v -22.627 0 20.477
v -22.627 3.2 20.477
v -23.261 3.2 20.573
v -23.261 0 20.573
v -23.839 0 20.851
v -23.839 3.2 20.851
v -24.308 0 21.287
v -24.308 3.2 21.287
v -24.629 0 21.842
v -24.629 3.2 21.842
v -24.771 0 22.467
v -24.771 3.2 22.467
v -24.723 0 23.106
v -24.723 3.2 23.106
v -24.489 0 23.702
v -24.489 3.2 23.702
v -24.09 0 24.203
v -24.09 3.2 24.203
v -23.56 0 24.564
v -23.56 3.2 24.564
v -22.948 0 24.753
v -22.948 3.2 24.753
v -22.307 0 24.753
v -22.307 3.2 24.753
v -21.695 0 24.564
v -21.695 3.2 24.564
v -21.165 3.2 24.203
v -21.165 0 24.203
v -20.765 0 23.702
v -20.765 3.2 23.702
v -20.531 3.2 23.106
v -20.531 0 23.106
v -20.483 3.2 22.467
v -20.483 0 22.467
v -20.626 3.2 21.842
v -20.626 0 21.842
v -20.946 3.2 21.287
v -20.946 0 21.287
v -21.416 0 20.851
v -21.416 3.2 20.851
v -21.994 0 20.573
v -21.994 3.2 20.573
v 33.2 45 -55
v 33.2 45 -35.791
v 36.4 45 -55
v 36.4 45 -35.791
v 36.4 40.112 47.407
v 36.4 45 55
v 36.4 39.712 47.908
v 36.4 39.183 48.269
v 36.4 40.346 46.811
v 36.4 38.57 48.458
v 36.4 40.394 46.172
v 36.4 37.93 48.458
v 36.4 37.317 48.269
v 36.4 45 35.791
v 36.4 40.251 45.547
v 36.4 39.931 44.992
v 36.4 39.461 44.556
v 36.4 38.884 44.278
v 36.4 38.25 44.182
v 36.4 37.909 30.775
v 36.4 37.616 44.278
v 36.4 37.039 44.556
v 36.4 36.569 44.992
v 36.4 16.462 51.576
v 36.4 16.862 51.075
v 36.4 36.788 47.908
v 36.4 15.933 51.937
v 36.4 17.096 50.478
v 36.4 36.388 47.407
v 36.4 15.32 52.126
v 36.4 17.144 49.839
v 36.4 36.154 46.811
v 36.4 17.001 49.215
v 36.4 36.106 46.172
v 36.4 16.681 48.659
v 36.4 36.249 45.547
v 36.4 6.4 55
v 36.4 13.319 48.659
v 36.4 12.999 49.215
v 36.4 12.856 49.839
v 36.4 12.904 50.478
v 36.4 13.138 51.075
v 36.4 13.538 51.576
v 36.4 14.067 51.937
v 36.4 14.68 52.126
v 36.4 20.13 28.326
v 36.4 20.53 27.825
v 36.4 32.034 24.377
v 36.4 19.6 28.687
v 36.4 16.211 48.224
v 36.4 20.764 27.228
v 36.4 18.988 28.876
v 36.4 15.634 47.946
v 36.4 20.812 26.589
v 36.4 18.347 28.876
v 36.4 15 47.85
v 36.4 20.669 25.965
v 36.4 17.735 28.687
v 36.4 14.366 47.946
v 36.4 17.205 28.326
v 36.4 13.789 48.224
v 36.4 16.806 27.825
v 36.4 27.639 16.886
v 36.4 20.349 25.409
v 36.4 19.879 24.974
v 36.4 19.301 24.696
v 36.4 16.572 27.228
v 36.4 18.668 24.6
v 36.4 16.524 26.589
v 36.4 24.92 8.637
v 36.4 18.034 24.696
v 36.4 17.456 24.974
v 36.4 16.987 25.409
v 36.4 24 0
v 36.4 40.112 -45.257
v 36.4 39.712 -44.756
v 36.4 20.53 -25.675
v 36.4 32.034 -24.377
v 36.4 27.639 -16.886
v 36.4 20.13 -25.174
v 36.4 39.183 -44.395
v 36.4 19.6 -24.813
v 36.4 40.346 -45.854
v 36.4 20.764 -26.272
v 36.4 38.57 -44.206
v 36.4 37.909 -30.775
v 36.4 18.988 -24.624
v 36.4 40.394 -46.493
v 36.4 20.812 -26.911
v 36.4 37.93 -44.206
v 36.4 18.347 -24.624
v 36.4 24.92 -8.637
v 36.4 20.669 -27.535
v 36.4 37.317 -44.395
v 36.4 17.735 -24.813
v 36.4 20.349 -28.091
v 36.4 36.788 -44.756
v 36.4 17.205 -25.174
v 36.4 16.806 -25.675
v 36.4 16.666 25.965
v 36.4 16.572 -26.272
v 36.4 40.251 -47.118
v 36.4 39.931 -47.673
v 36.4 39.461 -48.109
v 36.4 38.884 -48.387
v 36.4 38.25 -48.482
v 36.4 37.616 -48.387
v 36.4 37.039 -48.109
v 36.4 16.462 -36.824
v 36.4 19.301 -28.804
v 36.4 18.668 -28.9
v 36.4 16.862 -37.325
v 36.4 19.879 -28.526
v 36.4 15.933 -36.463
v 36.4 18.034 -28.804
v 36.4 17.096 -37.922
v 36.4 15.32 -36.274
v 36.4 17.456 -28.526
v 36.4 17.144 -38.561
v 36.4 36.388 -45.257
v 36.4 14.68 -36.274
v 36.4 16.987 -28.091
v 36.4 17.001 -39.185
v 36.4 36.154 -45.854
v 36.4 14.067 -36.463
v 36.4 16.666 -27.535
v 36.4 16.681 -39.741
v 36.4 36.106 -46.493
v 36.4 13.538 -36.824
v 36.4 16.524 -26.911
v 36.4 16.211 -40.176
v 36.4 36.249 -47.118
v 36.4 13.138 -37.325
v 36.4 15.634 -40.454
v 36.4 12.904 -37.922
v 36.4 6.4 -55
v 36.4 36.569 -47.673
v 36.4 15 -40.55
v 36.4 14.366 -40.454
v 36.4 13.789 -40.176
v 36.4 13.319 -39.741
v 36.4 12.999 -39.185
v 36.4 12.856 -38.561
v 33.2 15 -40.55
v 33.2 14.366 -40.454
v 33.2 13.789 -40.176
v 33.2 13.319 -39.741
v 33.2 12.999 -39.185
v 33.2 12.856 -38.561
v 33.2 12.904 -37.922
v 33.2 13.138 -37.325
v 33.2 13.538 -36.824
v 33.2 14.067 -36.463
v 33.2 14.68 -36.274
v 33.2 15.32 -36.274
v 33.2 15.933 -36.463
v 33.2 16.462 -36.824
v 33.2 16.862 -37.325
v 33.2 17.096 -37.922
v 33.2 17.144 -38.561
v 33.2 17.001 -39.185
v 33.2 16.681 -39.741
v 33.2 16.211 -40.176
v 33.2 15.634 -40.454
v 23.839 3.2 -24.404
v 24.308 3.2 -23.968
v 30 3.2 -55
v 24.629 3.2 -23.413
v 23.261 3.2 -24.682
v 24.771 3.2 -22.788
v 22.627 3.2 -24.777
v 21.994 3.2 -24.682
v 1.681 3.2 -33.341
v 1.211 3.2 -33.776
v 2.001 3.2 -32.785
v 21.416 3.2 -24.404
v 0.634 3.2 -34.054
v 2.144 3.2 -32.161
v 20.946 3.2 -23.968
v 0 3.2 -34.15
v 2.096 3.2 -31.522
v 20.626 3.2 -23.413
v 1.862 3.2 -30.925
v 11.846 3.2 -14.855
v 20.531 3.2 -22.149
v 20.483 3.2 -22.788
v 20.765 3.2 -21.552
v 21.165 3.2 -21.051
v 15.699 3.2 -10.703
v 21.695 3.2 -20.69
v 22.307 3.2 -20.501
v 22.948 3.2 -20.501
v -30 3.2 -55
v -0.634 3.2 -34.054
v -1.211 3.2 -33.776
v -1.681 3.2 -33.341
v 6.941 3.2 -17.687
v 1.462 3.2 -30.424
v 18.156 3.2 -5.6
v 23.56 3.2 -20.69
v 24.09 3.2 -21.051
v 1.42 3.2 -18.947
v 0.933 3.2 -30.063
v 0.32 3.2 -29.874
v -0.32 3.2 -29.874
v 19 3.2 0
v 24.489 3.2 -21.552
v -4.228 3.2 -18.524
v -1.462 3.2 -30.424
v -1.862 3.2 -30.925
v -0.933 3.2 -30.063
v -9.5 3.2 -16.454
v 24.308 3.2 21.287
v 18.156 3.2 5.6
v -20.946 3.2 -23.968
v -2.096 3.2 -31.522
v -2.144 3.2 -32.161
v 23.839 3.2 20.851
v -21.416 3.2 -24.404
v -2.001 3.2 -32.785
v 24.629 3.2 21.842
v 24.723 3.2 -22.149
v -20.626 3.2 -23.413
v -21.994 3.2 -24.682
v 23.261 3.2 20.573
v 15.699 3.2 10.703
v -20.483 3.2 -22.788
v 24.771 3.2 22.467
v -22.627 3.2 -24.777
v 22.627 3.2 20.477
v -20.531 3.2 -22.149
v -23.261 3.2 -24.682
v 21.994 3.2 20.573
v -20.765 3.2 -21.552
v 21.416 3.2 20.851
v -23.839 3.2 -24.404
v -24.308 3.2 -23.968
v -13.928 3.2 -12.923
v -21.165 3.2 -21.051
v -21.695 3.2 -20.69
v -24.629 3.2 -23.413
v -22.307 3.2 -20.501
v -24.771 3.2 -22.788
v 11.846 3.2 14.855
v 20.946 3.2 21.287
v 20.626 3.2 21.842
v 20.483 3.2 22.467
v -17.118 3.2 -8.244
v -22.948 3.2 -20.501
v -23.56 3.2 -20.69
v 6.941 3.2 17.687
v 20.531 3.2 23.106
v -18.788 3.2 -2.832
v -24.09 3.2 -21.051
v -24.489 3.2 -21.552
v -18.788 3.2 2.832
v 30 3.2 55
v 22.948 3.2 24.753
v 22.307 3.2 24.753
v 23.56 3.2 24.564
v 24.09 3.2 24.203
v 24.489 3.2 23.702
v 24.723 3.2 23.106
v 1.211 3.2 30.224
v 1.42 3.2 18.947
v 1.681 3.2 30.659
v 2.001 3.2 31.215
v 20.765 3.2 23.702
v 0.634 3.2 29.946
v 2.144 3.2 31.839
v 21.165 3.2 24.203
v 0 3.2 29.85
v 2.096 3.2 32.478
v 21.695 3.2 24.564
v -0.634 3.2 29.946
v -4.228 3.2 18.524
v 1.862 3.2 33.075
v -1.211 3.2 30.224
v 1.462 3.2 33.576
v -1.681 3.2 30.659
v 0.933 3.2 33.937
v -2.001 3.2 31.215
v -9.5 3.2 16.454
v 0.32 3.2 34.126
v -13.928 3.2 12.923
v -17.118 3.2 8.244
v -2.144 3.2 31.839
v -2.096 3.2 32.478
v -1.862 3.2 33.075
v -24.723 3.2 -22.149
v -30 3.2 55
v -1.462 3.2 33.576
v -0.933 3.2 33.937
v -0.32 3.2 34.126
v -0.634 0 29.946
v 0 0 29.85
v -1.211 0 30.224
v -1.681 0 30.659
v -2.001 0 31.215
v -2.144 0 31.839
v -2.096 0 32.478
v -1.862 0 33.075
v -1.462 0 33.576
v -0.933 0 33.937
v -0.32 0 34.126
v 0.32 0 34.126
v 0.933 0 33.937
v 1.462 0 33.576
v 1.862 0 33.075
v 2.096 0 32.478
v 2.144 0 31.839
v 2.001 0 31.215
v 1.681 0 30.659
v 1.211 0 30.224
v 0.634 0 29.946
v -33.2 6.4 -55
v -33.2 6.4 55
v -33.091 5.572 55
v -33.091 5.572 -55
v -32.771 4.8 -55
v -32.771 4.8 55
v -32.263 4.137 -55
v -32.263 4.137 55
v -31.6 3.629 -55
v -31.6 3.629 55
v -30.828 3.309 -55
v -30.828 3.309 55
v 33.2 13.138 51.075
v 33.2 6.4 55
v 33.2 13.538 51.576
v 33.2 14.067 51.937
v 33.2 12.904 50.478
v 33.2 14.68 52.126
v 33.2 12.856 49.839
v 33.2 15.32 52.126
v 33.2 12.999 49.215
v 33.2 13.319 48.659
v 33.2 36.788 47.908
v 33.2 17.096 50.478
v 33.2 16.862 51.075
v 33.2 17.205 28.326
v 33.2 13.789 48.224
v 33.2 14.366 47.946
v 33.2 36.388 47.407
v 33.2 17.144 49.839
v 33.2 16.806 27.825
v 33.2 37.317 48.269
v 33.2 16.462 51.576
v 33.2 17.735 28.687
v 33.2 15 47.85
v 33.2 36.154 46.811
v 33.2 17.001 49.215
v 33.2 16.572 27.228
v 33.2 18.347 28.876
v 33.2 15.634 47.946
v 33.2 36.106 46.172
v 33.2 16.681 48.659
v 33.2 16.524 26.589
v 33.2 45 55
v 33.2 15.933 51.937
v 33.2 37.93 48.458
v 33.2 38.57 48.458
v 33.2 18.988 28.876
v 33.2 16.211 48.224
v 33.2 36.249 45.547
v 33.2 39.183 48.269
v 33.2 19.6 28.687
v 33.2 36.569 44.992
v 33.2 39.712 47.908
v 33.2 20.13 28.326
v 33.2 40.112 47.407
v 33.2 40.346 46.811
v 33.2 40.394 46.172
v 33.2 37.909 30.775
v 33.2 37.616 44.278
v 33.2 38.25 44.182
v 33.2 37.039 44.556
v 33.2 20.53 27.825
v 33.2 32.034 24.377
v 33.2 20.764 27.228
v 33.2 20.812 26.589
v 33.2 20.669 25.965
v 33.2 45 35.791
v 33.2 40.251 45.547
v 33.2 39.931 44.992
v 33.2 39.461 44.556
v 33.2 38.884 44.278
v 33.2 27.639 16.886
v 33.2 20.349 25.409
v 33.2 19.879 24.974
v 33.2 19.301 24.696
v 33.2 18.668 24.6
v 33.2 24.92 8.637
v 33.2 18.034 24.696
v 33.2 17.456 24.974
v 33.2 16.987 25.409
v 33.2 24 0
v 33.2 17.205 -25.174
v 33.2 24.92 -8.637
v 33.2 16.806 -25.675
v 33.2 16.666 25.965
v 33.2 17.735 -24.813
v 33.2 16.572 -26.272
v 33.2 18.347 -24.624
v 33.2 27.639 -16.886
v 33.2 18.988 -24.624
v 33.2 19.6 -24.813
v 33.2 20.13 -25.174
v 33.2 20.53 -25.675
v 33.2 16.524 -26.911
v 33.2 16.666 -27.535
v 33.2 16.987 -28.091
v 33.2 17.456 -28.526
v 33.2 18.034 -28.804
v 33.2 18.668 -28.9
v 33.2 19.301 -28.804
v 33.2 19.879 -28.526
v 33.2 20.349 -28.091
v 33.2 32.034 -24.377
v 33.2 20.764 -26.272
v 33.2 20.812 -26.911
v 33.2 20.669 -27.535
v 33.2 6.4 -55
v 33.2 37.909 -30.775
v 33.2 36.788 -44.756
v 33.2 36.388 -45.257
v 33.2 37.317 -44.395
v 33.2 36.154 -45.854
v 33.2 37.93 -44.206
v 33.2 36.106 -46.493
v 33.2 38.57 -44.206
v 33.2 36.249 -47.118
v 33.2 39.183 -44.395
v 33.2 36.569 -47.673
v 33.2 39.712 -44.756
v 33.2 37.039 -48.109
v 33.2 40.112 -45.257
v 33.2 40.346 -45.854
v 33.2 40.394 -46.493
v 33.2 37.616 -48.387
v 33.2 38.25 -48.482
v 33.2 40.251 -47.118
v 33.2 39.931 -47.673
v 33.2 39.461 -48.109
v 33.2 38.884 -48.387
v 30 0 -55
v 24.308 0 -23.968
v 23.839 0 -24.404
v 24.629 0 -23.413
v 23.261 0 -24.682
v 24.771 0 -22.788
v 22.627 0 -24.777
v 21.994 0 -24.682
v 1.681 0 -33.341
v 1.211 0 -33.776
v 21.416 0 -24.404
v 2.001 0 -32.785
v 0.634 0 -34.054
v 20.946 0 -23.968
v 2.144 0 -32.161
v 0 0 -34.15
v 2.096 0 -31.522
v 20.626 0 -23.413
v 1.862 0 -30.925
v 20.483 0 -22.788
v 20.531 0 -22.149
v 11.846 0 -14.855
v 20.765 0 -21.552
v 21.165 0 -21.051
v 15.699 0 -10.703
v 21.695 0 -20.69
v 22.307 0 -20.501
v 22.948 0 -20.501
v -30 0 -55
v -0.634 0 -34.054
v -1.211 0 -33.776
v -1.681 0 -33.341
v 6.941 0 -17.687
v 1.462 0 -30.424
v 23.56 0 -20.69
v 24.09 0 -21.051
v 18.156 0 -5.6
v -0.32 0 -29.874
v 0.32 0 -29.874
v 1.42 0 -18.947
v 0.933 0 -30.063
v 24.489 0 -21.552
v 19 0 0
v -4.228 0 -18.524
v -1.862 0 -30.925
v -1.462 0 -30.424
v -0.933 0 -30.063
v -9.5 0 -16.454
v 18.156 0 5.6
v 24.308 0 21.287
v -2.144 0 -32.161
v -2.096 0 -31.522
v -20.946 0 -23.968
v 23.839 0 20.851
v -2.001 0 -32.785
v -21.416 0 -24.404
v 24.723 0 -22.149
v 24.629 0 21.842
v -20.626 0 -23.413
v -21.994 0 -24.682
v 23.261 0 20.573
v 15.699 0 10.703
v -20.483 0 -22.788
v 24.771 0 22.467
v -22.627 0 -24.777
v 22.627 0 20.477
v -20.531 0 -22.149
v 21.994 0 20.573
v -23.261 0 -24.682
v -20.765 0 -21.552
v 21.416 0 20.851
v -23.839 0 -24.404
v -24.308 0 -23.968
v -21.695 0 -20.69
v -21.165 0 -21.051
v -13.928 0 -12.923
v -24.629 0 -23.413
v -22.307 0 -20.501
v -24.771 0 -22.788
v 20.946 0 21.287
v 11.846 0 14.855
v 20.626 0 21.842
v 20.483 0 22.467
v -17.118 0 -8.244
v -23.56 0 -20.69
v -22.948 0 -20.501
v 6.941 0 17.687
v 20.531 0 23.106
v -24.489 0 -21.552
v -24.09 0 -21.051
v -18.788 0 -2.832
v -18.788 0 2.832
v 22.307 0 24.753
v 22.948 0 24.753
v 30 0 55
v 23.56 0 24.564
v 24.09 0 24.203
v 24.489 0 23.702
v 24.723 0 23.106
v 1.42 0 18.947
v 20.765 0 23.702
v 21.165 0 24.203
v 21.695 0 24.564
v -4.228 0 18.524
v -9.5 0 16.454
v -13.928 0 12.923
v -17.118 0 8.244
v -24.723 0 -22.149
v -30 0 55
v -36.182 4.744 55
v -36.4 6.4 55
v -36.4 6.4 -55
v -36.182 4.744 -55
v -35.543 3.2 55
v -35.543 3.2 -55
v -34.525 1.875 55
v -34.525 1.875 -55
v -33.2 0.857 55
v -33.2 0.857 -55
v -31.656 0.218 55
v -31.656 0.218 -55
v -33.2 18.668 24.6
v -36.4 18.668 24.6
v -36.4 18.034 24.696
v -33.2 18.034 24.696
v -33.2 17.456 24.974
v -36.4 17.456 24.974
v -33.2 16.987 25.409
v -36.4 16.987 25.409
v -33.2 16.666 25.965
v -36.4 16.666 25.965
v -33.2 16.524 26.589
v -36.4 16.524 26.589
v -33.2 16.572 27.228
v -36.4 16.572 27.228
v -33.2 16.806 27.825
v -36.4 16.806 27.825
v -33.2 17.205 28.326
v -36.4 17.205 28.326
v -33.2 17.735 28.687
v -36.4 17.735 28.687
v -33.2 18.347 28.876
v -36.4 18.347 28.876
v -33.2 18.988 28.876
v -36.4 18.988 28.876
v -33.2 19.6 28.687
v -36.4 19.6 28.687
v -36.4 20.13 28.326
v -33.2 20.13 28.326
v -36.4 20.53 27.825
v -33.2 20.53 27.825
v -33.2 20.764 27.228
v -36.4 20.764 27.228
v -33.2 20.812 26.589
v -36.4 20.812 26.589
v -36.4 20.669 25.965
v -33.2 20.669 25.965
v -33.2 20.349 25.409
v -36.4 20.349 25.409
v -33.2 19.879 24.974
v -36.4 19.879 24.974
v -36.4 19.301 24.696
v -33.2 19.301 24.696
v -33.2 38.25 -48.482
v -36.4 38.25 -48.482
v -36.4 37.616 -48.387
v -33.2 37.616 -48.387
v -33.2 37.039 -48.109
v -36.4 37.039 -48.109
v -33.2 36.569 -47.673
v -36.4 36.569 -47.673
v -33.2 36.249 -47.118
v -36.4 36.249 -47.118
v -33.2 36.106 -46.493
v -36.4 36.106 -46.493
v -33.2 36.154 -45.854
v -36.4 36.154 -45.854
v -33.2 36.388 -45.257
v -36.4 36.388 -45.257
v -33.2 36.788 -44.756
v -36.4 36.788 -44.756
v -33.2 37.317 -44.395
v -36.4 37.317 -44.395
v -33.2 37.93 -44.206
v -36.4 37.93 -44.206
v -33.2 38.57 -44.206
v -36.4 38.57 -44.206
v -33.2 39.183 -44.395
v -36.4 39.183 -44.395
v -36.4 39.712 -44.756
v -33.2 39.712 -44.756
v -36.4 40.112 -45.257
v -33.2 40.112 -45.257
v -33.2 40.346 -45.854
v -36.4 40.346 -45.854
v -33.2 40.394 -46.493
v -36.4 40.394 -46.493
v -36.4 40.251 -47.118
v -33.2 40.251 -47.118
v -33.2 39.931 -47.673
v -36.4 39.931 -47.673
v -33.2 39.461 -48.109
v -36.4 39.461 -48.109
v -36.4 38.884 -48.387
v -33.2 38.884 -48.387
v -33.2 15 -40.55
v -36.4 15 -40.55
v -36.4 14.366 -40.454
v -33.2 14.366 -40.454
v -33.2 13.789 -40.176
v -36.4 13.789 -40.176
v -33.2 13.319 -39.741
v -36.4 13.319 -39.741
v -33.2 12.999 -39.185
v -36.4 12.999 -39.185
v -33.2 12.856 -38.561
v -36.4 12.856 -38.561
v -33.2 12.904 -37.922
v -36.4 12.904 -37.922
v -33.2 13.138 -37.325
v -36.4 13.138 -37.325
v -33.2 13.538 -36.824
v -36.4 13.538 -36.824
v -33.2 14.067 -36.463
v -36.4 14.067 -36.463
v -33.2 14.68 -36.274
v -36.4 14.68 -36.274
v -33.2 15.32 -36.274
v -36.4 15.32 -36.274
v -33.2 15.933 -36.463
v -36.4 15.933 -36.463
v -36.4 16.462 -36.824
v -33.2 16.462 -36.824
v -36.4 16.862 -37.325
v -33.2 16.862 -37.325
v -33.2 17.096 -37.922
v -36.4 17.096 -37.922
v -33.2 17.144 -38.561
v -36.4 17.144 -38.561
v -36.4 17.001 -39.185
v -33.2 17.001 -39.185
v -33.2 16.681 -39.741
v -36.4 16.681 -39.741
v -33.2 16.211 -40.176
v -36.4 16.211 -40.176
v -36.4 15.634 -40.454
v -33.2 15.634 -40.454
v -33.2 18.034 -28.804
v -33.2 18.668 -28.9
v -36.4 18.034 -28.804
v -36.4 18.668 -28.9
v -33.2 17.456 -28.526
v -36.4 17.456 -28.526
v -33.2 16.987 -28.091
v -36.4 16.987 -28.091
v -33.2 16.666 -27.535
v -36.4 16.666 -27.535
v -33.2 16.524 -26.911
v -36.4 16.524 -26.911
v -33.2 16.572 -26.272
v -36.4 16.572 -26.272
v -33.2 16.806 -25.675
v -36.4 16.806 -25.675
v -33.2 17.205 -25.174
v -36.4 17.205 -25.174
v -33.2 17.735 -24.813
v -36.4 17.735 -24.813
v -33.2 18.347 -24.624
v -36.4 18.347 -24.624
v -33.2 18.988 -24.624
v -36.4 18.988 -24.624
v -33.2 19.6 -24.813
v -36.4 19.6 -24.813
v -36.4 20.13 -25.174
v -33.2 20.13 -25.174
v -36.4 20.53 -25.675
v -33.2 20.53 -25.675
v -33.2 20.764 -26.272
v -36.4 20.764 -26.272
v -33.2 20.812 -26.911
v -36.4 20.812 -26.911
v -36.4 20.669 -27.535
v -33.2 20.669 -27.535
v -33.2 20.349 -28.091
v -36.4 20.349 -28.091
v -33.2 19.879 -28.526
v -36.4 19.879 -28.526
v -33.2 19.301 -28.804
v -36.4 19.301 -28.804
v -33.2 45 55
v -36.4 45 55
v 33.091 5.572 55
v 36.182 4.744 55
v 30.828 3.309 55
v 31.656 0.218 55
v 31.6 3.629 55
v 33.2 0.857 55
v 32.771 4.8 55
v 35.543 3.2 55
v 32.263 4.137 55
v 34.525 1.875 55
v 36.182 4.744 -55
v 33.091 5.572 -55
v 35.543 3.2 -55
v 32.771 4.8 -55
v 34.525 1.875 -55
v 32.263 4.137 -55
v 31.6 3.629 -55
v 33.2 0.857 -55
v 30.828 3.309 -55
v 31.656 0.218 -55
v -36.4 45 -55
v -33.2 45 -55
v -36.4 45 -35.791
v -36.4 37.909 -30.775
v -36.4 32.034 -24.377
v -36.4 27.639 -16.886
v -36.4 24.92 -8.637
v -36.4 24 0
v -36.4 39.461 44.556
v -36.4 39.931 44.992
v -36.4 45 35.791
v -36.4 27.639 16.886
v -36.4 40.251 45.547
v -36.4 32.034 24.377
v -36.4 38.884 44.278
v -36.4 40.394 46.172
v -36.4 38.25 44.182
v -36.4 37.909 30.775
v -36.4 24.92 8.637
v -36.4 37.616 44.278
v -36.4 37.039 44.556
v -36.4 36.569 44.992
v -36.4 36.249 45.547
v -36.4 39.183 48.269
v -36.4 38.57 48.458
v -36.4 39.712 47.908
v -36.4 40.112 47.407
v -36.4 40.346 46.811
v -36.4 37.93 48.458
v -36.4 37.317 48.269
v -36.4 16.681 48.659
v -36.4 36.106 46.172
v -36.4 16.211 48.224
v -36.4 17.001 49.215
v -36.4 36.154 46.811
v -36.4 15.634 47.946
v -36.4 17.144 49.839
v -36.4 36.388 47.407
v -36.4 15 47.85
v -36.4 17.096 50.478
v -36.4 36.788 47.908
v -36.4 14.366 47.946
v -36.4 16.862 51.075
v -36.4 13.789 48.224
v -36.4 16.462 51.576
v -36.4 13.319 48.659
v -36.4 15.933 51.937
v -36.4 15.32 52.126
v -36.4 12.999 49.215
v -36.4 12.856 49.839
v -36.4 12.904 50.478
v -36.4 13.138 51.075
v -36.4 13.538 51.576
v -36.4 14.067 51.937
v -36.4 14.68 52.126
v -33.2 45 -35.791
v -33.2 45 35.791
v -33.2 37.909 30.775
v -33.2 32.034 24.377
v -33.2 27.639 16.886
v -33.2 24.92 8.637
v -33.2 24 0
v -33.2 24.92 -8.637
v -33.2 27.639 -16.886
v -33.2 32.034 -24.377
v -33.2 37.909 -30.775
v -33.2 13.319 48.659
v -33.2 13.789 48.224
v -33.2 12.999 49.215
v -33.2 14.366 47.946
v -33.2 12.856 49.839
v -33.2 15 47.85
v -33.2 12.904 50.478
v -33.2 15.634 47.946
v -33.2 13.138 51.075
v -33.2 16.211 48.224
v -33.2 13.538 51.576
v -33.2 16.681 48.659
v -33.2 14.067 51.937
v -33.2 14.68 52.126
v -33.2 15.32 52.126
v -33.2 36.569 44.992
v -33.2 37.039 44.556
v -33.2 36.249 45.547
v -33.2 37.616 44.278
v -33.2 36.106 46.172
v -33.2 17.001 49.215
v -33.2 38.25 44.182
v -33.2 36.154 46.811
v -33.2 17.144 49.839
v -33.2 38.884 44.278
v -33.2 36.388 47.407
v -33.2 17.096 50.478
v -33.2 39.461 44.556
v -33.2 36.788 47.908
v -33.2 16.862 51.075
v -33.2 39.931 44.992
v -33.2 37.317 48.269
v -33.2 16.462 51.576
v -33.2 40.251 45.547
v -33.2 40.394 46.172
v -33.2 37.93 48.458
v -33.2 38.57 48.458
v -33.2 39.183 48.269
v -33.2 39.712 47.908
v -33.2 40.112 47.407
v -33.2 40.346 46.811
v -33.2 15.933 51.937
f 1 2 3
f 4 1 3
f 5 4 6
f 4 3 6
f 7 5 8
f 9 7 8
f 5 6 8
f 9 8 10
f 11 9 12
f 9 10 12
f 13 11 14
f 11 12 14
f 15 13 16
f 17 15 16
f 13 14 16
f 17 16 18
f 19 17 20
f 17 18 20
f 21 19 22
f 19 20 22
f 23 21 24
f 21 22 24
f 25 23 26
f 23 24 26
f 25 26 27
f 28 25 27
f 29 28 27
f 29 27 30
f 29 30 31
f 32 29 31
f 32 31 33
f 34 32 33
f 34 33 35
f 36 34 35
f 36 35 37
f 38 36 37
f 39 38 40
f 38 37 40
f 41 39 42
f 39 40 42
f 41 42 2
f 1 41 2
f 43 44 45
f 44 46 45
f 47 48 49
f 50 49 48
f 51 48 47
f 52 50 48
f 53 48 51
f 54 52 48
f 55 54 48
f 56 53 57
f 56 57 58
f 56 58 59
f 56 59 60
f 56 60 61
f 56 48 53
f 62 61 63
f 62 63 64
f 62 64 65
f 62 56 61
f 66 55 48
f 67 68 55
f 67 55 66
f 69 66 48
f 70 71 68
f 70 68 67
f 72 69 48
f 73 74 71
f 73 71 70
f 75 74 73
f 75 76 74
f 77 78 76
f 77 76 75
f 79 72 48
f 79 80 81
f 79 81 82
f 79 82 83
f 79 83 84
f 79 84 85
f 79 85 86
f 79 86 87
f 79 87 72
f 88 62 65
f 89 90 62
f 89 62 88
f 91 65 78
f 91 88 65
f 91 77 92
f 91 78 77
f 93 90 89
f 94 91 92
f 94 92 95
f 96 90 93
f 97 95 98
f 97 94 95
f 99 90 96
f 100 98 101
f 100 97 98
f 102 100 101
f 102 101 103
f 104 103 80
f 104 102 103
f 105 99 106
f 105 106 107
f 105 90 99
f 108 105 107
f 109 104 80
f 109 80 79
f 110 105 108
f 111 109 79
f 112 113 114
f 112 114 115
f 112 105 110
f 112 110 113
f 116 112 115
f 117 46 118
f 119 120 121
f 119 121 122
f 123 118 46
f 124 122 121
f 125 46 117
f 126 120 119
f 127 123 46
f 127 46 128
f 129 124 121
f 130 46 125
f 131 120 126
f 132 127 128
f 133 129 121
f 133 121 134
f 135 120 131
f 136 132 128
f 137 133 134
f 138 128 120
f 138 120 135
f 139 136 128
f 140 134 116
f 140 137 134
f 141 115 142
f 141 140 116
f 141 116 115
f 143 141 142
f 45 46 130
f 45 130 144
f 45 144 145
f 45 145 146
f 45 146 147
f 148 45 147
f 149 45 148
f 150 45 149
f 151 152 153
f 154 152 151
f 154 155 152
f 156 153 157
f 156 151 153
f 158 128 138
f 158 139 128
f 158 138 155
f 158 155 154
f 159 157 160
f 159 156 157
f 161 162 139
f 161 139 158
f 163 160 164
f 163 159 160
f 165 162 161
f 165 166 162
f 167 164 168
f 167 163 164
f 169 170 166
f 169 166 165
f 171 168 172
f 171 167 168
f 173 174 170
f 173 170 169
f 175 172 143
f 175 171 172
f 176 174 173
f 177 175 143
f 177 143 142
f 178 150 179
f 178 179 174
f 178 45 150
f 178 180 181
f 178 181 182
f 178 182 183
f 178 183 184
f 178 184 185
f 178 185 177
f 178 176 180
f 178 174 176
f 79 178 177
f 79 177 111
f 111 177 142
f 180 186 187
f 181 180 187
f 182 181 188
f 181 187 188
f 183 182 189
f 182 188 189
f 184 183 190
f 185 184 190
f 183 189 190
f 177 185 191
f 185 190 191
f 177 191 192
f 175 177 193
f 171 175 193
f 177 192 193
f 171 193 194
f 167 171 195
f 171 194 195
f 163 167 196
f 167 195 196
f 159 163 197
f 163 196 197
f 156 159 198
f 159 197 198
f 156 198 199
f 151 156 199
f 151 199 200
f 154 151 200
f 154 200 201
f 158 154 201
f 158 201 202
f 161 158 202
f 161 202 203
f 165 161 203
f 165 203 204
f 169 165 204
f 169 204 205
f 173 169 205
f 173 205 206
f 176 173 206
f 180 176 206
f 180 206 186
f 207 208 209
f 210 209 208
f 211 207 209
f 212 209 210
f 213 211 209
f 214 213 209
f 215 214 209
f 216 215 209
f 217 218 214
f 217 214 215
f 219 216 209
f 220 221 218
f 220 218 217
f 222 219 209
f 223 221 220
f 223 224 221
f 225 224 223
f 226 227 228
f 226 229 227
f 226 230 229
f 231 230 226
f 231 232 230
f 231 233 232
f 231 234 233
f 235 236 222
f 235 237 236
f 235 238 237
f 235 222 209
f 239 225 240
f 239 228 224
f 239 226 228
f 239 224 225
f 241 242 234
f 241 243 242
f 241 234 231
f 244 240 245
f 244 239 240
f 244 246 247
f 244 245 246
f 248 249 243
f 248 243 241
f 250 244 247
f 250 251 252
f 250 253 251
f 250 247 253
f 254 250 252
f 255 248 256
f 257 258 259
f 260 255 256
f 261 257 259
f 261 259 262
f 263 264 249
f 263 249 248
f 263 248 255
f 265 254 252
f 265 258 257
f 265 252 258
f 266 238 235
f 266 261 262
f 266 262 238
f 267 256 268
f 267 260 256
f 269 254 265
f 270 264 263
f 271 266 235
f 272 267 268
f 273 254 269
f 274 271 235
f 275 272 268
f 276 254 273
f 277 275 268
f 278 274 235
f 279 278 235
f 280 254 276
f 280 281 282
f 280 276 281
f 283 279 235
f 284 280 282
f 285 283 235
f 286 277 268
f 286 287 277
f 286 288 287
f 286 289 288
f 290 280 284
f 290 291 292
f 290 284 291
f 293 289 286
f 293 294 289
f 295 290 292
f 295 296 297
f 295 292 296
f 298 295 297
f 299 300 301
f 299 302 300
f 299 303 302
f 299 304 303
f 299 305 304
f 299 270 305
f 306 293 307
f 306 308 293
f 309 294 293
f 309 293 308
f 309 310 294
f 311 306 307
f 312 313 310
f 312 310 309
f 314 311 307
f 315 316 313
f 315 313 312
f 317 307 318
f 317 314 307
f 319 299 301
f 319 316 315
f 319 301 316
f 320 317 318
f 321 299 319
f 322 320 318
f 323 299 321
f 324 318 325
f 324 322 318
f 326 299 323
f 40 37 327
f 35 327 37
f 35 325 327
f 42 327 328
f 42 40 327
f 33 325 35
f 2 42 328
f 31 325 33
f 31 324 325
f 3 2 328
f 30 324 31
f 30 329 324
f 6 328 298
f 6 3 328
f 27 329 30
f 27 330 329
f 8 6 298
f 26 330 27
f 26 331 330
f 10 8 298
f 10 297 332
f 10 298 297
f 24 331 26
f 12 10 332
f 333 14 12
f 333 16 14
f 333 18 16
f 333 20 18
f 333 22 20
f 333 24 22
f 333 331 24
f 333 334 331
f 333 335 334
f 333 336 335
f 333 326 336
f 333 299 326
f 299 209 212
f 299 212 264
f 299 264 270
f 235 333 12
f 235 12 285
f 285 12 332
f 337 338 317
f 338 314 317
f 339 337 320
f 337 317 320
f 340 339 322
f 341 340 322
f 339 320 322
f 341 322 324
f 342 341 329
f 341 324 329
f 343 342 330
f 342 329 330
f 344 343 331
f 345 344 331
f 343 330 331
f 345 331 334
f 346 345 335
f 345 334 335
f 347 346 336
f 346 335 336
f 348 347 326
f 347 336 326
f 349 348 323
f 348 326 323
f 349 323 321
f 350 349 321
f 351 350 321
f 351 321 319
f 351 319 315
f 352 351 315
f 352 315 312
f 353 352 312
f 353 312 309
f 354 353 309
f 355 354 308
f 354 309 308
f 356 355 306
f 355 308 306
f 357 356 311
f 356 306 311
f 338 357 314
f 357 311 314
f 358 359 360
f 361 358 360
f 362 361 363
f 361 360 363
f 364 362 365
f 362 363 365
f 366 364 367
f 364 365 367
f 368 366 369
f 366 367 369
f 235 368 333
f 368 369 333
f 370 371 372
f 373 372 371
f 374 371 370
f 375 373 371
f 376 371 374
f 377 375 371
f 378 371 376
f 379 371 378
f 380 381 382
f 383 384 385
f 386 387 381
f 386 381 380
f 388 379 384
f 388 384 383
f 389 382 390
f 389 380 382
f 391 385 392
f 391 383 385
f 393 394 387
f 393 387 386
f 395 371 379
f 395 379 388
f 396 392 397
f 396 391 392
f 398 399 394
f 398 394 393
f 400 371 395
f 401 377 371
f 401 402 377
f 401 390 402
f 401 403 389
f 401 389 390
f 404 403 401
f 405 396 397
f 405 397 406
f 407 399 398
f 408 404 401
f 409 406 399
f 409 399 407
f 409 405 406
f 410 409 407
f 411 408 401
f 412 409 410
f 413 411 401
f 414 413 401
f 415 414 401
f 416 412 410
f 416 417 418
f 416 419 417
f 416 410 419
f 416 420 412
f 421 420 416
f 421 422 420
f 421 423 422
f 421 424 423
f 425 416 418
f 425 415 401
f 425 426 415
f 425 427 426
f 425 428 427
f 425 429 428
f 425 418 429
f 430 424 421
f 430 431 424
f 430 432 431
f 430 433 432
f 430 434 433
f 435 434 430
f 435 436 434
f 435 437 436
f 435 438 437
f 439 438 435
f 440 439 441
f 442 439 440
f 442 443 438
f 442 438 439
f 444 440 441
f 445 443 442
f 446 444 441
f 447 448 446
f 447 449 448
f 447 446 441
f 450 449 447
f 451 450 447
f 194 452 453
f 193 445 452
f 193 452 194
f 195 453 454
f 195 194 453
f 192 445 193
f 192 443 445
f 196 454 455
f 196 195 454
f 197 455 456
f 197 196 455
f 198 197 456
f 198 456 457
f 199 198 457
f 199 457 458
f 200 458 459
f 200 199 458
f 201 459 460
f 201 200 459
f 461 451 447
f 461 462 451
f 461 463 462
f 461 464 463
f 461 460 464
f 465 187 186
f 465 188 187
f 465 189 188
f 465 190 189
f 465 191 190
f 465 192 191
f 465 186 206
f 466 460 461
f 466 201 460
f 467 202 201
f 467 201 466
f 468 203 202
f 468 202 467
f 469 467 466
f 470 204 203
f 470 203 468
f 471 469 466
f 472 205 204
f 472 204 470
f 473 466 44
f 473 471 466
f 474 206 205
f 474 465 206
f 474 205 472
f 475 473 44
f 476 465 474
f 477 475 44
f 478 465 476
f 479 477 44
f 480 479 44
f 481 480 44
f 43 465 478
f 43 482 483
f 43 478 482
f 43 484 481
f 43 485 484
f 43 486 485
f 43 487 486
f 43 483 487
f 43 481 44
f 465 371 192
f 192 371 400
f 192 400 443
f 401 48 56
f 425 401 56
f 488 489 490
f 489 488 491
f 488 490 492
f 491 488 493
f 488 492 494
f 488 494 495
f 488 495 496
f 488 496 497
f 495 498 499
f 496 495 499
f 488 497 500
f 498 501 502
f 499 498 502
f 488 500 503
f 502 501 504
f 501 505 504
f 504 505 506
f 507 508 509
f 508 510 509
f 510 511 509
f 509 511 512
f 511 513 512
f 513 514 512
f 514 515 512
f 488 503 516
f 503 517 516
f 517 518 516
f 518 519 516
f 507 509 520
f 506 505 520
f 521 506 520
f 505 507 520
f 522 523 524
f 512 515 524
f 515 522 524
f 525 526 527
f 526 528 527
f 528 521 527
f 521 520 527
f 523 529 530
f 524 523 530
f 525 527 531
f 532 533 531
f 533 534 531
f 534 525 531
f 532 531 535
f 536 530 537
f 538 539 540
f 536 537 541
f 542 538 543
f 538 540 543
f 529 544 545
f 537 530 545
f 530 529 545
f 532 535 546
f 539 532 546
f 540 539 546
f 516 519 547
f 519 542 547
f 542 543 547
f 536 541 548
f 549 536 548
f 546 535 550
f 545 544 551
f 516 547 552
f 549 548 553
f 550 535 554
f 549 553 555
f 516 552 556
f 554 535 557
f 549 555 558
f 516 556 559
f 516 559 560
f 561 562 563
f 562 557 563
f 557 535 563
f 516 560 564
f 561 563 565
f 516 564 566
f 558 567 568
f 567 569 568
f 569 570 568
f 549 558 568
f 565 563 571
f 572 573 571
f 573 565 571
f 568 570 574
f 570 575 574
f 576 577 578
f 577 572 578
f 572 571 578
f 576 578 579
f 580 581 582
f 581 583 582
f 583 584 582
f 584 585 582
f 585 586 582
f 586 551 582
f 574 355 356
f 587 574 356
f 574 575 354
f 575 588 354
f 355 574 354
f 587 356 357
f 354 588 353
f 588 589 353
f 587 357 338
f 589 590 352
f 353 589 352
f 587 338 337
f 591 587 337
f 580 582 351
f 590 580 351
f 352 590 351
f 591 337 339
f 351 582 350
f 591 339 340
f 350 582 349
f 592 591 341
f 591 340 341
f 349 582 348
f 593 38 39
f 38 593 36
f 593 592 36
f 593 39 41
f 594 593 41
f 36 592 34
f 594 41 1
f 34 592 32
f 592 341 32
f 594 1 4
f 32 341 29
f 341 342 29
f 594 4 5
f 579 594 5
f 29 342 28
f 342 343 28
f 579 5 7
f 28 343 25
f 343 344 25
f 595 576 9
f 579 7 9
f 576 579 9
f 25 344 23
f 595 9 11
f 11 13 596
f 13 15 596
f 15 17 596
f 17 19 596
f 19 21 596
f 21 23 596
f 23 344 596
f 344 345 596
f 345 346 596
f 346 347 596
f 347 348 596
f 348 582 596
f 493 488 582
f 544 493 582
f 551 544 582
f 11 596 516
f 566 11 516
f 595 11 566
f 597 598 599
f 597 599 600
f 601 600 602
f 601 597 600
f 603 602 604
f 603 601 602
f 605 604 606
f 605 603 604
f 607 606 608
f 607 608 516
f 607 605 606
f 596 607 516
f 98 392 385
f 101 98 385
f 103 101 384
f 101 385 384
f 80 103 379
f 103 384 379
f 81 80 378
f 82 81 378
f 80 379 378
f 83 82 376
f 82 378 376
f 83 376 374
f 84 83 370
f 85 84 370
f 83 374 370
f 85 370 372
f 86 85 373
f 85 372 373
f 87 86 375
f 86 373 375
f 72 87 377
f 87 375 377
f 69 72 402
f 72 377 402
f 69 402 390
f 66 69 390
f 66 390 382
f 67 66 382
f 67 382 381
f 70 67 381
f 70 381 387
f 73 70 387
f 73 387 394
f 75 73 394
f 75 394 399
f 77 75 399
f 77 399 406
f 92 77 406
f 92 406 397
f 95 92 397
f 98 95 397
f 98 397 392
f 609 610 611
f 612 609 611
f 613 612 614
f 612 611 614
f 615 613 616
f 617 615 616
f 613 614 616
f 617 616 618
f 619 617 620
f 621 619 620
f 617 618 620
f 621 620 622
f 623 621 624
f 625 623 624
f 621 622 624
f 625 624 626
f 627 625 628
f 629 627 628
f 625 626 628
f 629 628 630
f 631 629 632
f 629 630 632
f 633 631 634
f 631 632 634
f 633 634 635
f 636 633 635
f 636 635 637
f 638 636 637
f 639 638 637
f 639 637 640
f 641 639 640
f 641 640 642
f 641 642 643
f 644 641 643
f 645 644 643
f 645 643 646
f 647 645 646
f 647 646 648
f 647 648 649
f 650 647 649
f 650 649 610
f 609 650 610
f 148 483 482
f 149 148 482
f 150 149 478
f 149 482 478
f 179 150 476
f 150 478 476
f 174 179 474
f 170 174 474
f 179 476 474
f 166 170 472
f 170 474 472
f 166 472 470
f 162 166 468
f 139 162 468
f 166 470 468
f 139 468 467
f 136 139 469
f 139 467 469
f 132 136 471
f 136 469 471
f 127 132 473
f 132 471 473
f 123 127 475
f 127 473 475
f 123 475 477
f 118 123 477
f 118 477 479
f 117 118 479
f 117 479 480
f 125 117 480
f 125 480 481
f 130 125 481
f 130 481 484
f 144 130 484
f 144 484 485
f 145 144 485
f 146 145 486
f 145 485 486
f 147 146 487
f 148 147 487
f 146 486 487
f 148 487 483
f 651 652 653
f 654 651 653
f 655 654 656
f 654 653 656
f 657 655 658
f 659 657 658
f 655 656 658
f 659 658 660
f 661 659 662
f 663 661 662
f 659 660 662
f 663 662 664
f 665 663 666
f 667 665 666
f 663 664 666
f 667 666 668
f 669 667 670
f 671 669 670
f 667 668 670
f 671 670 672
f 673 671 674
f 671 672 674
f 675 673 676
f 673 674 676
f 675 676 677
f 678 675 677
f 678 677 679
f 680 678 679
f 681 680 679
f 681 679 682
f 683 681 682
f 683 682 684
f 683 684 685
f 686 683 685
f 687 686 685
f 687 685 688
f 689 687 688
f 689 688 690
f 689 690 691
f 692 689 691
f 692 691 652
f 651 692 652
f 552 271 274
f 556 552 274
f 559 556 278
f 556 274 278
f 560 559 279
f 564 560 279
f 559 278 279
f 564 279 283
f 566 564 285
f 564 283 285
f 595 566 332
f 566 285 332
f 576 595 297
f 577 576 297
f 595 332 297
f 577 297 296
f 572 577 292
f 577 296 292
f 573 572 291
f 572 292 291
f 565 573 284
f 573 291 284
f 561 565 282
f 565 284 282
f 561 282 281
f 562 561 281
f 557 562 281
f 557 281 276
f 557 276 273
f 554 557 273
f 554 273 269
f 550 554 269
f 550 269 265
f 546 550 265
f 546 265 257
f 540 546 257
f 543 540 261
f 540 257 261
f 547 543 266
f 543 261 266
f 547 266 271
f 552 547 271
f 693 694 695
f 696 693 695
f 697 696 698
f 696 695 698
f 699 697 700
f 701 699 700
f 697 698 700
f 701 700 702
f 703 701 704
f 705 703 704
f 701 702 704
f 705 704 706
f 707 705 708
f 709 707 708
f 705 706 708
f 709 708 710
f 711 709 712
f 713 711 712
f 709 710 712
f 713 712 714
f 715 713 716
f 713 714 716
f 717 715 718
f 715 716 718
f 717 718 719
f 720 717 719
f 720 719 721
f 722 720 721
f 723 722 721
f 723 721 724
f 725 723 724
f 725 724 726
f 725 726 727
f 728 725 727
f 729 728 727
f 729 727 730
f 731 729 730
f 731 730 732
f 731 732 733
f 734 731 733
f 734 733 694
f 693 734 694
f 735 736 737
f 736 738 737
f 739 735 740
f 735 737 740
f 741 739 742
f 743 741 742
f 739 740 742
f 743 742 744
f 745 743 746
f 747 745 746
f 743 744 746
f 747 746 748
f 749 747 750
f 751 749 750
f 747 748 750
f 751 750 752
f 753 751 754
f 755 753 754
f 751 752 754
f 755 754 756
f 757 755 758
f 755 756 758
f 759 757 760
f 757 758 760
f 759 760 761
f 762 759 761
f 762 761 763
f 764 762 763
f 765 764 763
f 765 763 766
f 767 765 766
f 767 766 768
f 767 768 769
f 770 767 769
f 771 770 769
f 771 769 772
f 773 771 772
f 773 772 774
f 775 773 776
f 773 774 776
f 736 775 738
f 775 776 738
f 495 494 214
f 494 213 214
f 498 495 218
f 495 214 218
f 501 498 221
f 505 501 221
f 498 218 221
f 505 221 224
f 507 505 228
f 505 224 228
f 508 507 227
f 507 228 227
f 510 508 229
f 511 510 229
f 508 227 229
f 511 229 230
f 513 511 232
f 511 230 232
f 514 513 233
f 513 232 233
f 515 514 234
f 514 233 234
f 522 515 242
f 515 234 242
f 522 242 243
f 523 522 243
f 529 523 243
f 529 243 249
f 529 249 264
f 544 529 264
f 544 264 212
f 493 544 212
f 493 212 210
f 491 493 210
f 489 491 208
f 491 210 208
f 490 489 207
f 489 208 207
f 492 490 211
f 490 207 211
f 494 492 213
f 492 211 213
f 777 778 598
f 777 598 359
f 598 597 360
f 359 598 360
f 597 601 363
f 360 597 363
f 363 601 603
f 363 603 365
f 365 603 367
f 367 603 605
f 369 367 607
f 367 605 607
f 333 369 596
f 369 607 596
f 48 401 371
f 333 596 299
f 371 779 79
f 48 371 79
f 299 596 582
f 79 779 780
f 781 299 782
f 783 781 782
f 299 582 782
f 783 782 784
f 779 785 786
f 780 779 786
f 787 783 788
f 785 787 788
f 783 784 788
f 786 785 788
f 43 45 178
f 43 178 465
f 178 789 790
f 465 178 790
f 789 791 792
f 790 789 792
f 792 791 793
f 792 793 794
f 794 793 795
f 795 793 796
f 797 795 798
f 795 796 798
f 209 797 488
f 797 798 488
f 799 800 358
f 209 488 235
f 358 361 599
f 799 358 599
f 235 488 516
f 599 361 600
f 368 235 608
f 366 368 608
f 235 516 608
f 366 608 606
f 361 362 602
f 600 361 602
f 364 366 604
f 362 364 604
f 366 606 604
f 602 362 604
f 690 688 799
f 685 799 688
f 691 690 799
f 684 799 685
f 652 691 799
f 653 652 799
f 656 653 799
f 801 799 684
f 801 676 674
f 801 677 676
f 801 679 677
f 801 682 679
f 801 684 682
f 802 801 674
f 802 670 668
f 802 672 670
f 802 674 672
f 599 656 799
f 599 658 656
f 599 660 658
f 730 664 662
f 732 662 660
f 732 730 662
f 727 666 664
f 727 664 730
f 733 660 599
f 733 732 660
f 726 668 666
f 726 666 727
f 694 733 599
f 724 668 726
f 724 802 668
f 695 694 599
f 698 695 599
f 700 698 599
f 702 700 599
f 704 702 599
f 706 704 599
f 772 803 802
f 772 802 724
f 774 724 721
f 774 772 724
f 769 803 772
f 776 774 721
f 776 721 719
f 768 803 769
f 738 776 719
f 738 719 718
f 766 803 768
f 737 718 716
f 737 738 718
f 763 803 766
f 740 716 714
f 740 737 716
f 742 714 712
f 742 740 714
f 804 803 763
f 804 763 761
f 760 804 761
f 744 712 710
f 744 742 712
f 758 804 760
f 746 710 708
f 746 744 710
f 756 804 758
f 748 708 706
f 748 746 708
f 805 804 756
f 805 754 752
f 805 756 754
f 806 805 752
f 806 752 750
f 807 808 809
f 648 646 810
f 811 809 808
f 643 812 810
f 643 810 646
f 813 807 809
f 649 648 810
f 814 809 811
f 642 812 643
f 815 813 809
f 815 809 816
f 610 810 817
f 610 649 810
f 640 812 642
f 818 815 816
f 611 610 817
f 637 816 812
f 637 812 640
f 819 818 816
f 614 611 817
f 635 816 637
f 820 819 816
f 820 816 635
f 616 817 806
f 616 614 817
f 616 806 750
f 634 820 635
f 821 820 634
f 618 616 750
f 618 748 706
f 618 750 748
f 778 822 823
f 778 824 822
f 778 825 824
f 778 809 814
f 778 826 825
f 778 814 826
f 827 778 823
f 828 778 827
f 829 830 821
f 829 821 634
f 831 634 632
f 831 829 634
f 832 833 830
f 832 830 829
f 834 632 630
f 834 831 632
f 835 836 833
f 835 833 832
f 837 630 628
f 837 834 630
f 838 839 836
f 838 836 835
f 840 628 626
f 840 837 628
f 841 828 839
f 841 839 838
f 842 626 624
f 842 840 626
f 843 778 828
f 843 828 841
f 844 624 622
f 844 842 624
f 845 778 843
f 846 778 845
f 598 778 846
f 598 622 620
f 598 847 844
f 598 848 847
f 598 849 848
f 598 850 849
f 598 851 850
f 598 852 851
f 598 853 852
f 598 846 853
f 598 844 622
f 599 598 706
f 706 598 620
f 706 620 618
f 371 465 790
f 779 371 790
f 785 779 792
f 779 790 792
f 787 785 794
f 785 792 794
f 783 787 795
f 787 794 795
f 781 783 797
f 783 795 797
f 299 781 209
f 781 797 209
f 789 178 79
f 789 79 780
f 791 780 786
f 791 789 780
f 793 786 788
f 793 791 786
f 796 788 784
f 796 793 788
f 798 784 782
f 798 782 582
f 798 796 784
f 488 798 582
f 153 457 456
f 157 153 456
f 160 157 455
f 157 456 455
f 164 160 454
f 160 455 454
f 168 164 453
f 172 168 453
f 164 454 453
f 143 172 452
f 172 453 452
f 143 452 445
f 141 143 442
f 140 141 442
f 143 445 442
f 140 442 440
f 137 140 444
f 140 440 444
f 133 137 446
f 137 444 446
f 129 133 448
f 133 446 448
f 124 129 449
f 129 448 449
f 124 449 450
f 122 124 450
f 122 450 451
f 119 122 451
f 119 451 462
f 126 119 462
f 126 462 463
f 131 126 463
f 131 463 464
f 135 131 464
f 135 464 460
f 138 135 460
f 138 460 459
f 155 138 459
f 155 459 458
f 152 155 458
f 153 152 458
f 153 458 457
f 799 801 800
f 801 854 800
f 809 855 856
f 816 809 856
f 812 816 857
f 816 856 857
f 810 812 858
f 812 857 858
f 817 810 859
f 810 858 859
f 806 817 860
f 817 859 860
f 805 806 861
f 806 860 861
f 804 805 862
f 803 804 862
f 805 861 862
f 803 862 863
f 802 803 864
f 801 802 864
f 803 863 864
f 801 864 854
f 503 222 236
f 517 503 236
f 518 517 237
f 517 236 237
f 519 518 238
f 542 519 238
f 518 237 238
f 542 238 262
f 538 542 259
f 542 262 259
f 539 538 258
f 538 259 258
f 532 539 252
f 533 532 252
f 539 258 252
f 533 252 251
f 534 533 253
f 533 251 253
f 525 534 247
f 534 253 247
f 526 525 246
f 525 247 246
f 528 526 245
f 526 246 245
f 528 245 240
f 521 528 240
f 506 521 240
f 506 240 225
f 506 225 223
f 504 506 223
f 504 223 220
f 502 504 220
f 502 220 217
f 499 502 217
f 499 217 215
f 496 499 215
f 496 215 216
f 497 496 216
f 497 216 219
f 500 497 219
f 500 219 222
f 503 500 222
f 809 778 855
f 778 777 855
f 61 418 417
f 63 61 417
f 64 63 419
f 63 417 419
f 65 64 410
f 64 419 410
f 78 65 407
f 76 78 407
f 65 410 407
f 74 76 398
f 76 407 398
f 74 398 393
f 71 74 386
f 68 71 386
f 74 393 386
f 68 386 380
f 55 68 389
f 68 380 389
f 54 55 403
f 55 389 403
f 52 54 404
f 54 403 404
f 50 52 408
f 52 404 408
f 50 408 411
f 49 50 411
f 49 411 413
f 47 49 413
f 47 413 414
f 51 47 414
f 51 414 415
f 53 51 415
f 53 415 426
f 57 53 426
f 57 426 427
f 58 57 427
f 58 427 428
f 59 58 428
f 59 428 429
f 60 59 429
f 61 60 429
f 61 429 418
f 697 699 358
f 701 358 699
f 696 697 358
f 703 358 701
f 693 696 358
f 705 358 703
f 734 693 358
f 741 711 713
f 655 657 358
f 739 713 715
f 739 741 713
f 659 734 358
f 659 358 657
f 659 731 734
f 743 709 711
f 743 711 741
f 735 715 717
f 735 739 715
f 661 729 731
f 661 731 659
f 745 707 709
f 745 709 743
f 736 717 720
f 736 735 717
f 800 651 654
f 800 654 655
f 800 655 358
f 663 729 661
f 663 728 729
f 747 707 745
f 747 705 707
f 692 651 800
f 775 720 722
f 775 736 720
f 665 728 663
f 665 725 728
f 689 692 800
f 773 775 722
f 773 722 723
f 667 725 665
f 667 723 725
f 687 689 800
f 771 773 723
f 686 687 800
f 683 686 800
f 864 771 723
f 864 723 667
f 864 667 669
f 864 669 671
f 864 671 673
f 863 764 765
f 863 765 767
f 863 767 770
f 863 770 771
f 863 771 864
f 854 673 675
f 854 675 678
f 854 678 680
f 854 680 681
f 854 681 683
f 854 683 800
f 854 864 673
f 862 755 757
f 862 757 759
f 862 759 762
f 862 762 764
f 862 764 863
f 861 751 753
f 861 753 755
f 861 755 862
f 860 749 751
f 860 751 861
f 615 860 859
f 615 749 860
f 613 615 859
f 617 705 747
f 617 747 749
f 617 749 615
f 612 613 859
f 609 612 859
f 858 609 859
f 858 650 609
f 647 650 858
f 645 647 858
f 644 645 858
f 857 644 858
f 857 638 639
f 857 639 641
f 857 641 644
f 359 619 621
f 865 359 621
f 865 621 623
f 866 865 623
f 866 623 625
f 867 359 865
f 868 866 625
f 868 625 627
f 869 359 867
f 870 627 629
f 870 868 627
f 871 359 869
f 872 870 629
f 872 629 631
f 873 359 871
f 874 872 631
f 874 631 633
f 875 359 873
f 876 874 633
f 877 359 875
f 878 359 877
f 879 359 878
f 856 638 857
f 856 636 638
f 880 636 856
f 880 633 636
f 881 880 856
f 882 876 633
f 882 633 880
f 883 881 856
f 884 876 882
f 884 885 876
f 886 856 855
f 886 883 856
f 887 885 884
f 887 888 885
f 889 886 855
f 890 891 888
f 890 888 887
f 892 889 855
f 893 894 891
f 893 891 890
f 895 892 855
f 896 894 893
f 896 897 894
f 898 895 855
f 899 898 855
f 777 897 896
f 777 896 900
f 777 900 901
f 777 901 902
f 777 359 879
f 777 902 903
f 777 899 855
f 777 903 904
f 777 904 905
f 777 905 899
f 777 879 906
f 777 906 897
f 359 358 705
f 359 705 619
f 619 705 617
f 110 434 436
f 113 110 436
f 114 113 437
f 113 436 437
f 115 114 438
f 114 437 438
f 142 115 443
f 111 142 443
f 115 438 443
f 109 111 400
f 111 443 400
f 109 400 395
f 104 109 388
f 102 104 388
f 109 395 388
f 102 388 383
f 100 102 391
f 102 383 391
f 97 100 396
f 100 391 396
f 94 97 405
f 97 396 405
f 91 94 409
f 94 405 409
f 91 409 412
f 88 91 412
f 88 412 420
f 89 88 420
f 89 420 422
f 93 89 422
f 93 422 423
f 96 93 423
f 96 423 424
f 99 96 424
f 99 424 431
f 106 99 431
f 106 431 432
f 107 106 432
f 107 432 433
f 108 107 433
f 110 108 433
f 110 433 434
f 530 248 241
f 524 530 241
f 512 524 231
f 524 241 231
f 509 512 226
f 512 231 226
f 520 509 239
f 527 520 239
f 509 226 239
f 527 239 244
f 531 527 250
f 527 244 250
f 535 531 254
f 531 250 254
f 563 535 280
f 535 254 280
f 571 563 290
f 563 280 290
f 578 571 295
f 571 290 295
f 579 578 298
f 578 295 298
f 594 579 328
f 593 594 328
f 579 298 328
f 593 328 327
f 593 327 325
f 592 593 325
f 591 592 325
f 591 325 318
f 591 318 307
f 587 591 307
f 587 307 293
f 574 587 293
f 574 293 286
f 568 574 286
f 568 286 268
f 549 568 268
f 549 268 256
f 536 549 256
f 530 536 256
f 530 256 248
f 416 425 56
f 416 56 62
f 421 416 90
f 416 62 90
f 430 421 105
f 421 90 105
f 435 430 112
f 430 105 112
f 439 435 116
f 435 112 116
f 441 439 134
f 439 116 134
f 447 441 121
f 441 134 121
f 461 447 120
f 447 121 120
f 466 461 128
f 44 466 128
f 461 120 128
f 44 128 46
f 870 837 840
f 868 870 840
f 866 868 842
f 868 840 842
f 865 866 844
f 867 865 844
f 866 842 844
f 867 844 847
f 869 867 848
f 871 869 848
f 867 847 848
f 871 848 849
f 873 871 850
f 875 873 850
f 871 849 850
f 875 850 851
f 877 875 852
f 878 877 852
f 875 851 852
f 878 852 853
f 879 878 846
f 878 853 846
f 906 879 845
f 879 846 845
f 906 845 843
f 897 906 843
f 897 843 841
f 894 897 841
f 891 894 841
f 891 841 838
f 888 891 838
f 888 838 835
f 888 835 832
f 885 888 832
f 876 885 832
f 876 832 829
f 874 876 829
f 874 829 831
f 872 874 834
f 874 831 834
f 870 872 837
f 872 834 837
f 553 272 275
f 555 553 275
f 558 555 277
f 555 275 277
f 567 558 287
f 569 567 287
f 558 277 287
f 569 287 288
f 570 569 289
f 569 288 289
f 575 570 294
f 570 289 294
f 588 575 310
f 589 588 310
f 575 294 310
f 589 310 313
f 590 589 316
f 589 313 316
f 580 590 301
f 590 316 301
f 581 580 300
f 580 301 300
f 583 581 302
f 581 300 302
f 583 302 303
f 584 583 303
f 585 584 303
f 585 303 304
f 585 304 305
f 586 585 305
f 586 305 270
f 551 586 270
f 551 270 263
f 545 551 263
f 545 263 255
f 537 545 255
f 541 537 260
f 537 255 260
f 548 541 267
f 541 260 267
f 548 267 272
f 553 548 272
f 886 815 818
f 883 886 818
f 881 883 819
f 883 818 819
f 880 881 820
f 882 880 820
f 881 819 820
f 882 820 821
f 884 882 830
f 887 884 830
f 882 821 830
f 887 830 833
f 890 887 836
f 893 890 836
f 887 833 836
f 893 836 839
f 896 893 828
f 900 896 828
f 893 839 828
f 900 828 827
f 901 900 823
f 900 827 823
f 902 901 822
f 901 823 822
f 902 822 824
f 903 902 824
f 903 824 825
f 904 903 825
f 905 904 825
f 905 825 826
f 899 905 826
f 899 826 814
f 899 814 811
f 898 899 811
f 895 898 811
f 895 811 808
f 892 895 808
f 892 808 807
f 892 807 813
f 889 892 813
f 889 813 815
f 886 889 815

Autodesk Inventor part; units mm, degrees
ref_plane "YZ Plane" through (0, 0, 0) normal (1, 0, 0) x (0, 1, 0)
ref_plane "XZ Plane" through (0, 0, 0) normal (0, 1, 0) x (-1, 0, 0)
ref_plane "XY Plane" through (0, 0, 0) normal (0, 0, 1) x (1, 0, 0)
sketch "スケッチ1" plane through (0, 0, 0) normal (0, 1, 0) x (-1, 0, 0)
  line L0 (30, 55) -> (-30, 55)
  line L1 (-30, 55) -> (-30, -55)
  line L2 (-30, -55) -> (30, -55)
  line L3 (30, -55) -> (30, 55)
  line L4 (30, 55) -> (-30, -55) construction
  line L5 (-30, 55) -> (30, -55) construction
  point P0 (0, 0)
  dimension "d0" = 60
  dimension "d1" = 110
extrude "プレート1" add sketch "スケッチ1" along normal blind 3.2
sketch "スケッチ2" plane through (-33.2, 6.4, 55) normal (-1, 0, 0) x (0, -1, 0)
  line L0 (0, -110) -> (0, 0)
  line L1 (0, 0) -> (-193.6, 0)
  line L2 (-193.6, 0) -> (-193.6, -110)
  line L3 (-193.6, -110) -> (0, -110)
edge flange "フランジ1" height 200 angle 90 thickness 3.2 bend radius 3.2 thickness toward (-1, 0, 0) relief tear relief width 3.2 relief depth 1.6 corner gap 3.2 corner form 0 edges at (-30, 3.2, 0) (30, 3.2, 0) wall of the first edge with corners at (-33.2, 6.4, -55) (-33.2, 6.4, 55) (-33.2, 200, 55) (-33.2, 200, -55)
bend "曲げ1"
corner "コーナー1"
sketch "スケッチ3" plane through (36.4, 200, 55) normal (1, 0, 0) x (0, 0, -1)
  circle A0 centre (55, -135) radius 41
  line L0 (0, -200) -> (110, -200) projected
  line L1 (0, -193.6) -> (0, 0) projected
  line L2 (110, 0) -> (110, -193.6) projected
  line L3 (0, 0) -> (0, -193.6) projected
  line L4 (110, 0) -> (0, 0) projected
  line L5 (0, -155) -> (110, -155)
  line L6 (110, -155) -> (110, 0)
  line L7 (110, 0) -> (0, 0)
  line L8 (0, 0) -> (0, -155)
  point P0 (55, -200)
  point P1 (90.7911, -155)
  point P2 (110, -155)
  point P3 (0, -155)
  point P4 (19.2089, -155)
  dimension "d13" = 82
  dimension "d14" = 65
  dimension "d17" = 45
extrude "押し出し1" cut sketch "スケッチ3" against normal through all
sketch "スケッチ4" plane through (36.4, 6.4, 55) normal (1, 0, 0) x (0, 0, -1)
  arc A0 (19.2089, 38.6) -> (90.7911, 38.6) centre (55, 58.6) ccw projected
  circle A1 centre (55, 58.6) radius 53.5
  point P0 (55, -6.4)
  point P1 (55, 112.1)
  point P2 (28.25, 104.9324)
  point P3 (8.6676, 85.35)
  point P4 (1.5, 58.6)
  point P5 (8.6676, 31.85)
  point P6 (28.25, 12.2676)
  point P7 (55, 5.1)
  point P8 (81.75, 12.2676)
  point P9 (101.3324, 31.85)
  point P10 (108.5, 58.6)
  point P11 (101.3324, 85.35)
  point P12 (81.75, 104.9324)
  dimension "d18" = 107
  dimension "d21" = 360
hole "穴1" at (36.4, 18.6676, 26.75) at (36.4, 38.25, 46.3324) at (36.4, 38.25, -46.3324) at (36.4, 18.6676, -26.75) direction (-1, 0, 0) diameter 4.3 end through all clearance for "Socket Head Cap Screw" size "M4" standard "Ansi Metric M Profile"
sketch "スケッチ5" plane through (36.4, 6.4, 55) normal (1, 0, 0) x (0, 0, -1)
  line L0 (0, 0) -> (0, 38.6) projected
  arc A0 (19.2089, 38.6) -> (90.7911, 38.6) centre (55, 58.6) ccw projected
  line L1 (0, 0) -> (110, 0) projected
  point P0 (55, -6.4)
  point P1 (5, 8.6)
  point P2 (93.4, 8.6)
  dimension "d30" = 88.4
  dimension "d31" = 5
  dimension "d34" = 50
hole "穴2" at (36.4, 15, 50) at (36.4, 15, -38.4) direction (-1, 0, 0) diameter 4.3 end through all clearance for "Socket Head Cap Screw" size "M4" standard "Ansi Metric M Profile"
sketch "スケッチ6" plane through (0, 0, 0) normal (0, -1, 0) x (1, 0, 0)
  circle A0 centre (0, 0) radius 32
  point P0 (0, 32)
  point P1 (-22.6274, 22.6274)
  point P2 (-32, 0)
  point P3 (-22.6274, -22.6274)
  point P4 (0, -32)
  point P5 (22.6274, -22.6274)
  point P6 (32, 0)
  point P7 (22.6274, 22.6274)
  dimension "d42" = 64
  dimension "d45" = 360
hole "穴3" at (22.6274, 0, 22.6274) at (-22.6274, 0, 22.6274) at (0, 0, 32) at (22.6274, 0, -22.6274) at (0, 0, -32) at (-22.6274, 0, -22.6274) direction (0, 1, 0) diameter 4.3 end through all clearance for "Socket Head Cap Screw" size "M4" standard "Ansi Metric M Profile"
sketch "スケッチ7" plane through (0, 3.2, 0) normal (0, 1, 0) x (1, 0, 0)
  circle A0 centre (0, 0) radius 19
  dimension "d54" = 38
extrude "押し出し2" cut sketch "スケッチ7" against normal blind 10
equation "\"d28\" = Thickness"
equation "\"d2\" = Thickness"
equation "\"d3\" = BendReliefWidth"
equation "\"d4\" = BendReliefDepth"
equation "\"d5\" = MinimumRemnant"
equation "\"d6\" = TransitionRadius"
equation "\"d9\" = BendRadius"
equation "\"d10\" = CornerReliefSize"
equation "\"d11\" = GapSize"
equation "\"d12\" = JacobiRadiusSize"
equation "\"BendRadius\" = Thickness"
equation "\"BendReliefWidth\" = Thickness"
equation "\"BendReliefDepth\" = 0.5 * Thickness"
equation "\"CornerReliefSize\" = 4 * Thickness"
equation "\"MinimumRemnant\" = 2 * Thickness"
equation "\"TransitionRadius\" = BendRadius"
equation "\"JacobiRadiusSize\" = BendRadius"
equation "\"GapSize\" = Thickness"
equation "\"Thickness\" = 3.2"
properties part number "steelplate2" material "鋼、炭素鋼"
